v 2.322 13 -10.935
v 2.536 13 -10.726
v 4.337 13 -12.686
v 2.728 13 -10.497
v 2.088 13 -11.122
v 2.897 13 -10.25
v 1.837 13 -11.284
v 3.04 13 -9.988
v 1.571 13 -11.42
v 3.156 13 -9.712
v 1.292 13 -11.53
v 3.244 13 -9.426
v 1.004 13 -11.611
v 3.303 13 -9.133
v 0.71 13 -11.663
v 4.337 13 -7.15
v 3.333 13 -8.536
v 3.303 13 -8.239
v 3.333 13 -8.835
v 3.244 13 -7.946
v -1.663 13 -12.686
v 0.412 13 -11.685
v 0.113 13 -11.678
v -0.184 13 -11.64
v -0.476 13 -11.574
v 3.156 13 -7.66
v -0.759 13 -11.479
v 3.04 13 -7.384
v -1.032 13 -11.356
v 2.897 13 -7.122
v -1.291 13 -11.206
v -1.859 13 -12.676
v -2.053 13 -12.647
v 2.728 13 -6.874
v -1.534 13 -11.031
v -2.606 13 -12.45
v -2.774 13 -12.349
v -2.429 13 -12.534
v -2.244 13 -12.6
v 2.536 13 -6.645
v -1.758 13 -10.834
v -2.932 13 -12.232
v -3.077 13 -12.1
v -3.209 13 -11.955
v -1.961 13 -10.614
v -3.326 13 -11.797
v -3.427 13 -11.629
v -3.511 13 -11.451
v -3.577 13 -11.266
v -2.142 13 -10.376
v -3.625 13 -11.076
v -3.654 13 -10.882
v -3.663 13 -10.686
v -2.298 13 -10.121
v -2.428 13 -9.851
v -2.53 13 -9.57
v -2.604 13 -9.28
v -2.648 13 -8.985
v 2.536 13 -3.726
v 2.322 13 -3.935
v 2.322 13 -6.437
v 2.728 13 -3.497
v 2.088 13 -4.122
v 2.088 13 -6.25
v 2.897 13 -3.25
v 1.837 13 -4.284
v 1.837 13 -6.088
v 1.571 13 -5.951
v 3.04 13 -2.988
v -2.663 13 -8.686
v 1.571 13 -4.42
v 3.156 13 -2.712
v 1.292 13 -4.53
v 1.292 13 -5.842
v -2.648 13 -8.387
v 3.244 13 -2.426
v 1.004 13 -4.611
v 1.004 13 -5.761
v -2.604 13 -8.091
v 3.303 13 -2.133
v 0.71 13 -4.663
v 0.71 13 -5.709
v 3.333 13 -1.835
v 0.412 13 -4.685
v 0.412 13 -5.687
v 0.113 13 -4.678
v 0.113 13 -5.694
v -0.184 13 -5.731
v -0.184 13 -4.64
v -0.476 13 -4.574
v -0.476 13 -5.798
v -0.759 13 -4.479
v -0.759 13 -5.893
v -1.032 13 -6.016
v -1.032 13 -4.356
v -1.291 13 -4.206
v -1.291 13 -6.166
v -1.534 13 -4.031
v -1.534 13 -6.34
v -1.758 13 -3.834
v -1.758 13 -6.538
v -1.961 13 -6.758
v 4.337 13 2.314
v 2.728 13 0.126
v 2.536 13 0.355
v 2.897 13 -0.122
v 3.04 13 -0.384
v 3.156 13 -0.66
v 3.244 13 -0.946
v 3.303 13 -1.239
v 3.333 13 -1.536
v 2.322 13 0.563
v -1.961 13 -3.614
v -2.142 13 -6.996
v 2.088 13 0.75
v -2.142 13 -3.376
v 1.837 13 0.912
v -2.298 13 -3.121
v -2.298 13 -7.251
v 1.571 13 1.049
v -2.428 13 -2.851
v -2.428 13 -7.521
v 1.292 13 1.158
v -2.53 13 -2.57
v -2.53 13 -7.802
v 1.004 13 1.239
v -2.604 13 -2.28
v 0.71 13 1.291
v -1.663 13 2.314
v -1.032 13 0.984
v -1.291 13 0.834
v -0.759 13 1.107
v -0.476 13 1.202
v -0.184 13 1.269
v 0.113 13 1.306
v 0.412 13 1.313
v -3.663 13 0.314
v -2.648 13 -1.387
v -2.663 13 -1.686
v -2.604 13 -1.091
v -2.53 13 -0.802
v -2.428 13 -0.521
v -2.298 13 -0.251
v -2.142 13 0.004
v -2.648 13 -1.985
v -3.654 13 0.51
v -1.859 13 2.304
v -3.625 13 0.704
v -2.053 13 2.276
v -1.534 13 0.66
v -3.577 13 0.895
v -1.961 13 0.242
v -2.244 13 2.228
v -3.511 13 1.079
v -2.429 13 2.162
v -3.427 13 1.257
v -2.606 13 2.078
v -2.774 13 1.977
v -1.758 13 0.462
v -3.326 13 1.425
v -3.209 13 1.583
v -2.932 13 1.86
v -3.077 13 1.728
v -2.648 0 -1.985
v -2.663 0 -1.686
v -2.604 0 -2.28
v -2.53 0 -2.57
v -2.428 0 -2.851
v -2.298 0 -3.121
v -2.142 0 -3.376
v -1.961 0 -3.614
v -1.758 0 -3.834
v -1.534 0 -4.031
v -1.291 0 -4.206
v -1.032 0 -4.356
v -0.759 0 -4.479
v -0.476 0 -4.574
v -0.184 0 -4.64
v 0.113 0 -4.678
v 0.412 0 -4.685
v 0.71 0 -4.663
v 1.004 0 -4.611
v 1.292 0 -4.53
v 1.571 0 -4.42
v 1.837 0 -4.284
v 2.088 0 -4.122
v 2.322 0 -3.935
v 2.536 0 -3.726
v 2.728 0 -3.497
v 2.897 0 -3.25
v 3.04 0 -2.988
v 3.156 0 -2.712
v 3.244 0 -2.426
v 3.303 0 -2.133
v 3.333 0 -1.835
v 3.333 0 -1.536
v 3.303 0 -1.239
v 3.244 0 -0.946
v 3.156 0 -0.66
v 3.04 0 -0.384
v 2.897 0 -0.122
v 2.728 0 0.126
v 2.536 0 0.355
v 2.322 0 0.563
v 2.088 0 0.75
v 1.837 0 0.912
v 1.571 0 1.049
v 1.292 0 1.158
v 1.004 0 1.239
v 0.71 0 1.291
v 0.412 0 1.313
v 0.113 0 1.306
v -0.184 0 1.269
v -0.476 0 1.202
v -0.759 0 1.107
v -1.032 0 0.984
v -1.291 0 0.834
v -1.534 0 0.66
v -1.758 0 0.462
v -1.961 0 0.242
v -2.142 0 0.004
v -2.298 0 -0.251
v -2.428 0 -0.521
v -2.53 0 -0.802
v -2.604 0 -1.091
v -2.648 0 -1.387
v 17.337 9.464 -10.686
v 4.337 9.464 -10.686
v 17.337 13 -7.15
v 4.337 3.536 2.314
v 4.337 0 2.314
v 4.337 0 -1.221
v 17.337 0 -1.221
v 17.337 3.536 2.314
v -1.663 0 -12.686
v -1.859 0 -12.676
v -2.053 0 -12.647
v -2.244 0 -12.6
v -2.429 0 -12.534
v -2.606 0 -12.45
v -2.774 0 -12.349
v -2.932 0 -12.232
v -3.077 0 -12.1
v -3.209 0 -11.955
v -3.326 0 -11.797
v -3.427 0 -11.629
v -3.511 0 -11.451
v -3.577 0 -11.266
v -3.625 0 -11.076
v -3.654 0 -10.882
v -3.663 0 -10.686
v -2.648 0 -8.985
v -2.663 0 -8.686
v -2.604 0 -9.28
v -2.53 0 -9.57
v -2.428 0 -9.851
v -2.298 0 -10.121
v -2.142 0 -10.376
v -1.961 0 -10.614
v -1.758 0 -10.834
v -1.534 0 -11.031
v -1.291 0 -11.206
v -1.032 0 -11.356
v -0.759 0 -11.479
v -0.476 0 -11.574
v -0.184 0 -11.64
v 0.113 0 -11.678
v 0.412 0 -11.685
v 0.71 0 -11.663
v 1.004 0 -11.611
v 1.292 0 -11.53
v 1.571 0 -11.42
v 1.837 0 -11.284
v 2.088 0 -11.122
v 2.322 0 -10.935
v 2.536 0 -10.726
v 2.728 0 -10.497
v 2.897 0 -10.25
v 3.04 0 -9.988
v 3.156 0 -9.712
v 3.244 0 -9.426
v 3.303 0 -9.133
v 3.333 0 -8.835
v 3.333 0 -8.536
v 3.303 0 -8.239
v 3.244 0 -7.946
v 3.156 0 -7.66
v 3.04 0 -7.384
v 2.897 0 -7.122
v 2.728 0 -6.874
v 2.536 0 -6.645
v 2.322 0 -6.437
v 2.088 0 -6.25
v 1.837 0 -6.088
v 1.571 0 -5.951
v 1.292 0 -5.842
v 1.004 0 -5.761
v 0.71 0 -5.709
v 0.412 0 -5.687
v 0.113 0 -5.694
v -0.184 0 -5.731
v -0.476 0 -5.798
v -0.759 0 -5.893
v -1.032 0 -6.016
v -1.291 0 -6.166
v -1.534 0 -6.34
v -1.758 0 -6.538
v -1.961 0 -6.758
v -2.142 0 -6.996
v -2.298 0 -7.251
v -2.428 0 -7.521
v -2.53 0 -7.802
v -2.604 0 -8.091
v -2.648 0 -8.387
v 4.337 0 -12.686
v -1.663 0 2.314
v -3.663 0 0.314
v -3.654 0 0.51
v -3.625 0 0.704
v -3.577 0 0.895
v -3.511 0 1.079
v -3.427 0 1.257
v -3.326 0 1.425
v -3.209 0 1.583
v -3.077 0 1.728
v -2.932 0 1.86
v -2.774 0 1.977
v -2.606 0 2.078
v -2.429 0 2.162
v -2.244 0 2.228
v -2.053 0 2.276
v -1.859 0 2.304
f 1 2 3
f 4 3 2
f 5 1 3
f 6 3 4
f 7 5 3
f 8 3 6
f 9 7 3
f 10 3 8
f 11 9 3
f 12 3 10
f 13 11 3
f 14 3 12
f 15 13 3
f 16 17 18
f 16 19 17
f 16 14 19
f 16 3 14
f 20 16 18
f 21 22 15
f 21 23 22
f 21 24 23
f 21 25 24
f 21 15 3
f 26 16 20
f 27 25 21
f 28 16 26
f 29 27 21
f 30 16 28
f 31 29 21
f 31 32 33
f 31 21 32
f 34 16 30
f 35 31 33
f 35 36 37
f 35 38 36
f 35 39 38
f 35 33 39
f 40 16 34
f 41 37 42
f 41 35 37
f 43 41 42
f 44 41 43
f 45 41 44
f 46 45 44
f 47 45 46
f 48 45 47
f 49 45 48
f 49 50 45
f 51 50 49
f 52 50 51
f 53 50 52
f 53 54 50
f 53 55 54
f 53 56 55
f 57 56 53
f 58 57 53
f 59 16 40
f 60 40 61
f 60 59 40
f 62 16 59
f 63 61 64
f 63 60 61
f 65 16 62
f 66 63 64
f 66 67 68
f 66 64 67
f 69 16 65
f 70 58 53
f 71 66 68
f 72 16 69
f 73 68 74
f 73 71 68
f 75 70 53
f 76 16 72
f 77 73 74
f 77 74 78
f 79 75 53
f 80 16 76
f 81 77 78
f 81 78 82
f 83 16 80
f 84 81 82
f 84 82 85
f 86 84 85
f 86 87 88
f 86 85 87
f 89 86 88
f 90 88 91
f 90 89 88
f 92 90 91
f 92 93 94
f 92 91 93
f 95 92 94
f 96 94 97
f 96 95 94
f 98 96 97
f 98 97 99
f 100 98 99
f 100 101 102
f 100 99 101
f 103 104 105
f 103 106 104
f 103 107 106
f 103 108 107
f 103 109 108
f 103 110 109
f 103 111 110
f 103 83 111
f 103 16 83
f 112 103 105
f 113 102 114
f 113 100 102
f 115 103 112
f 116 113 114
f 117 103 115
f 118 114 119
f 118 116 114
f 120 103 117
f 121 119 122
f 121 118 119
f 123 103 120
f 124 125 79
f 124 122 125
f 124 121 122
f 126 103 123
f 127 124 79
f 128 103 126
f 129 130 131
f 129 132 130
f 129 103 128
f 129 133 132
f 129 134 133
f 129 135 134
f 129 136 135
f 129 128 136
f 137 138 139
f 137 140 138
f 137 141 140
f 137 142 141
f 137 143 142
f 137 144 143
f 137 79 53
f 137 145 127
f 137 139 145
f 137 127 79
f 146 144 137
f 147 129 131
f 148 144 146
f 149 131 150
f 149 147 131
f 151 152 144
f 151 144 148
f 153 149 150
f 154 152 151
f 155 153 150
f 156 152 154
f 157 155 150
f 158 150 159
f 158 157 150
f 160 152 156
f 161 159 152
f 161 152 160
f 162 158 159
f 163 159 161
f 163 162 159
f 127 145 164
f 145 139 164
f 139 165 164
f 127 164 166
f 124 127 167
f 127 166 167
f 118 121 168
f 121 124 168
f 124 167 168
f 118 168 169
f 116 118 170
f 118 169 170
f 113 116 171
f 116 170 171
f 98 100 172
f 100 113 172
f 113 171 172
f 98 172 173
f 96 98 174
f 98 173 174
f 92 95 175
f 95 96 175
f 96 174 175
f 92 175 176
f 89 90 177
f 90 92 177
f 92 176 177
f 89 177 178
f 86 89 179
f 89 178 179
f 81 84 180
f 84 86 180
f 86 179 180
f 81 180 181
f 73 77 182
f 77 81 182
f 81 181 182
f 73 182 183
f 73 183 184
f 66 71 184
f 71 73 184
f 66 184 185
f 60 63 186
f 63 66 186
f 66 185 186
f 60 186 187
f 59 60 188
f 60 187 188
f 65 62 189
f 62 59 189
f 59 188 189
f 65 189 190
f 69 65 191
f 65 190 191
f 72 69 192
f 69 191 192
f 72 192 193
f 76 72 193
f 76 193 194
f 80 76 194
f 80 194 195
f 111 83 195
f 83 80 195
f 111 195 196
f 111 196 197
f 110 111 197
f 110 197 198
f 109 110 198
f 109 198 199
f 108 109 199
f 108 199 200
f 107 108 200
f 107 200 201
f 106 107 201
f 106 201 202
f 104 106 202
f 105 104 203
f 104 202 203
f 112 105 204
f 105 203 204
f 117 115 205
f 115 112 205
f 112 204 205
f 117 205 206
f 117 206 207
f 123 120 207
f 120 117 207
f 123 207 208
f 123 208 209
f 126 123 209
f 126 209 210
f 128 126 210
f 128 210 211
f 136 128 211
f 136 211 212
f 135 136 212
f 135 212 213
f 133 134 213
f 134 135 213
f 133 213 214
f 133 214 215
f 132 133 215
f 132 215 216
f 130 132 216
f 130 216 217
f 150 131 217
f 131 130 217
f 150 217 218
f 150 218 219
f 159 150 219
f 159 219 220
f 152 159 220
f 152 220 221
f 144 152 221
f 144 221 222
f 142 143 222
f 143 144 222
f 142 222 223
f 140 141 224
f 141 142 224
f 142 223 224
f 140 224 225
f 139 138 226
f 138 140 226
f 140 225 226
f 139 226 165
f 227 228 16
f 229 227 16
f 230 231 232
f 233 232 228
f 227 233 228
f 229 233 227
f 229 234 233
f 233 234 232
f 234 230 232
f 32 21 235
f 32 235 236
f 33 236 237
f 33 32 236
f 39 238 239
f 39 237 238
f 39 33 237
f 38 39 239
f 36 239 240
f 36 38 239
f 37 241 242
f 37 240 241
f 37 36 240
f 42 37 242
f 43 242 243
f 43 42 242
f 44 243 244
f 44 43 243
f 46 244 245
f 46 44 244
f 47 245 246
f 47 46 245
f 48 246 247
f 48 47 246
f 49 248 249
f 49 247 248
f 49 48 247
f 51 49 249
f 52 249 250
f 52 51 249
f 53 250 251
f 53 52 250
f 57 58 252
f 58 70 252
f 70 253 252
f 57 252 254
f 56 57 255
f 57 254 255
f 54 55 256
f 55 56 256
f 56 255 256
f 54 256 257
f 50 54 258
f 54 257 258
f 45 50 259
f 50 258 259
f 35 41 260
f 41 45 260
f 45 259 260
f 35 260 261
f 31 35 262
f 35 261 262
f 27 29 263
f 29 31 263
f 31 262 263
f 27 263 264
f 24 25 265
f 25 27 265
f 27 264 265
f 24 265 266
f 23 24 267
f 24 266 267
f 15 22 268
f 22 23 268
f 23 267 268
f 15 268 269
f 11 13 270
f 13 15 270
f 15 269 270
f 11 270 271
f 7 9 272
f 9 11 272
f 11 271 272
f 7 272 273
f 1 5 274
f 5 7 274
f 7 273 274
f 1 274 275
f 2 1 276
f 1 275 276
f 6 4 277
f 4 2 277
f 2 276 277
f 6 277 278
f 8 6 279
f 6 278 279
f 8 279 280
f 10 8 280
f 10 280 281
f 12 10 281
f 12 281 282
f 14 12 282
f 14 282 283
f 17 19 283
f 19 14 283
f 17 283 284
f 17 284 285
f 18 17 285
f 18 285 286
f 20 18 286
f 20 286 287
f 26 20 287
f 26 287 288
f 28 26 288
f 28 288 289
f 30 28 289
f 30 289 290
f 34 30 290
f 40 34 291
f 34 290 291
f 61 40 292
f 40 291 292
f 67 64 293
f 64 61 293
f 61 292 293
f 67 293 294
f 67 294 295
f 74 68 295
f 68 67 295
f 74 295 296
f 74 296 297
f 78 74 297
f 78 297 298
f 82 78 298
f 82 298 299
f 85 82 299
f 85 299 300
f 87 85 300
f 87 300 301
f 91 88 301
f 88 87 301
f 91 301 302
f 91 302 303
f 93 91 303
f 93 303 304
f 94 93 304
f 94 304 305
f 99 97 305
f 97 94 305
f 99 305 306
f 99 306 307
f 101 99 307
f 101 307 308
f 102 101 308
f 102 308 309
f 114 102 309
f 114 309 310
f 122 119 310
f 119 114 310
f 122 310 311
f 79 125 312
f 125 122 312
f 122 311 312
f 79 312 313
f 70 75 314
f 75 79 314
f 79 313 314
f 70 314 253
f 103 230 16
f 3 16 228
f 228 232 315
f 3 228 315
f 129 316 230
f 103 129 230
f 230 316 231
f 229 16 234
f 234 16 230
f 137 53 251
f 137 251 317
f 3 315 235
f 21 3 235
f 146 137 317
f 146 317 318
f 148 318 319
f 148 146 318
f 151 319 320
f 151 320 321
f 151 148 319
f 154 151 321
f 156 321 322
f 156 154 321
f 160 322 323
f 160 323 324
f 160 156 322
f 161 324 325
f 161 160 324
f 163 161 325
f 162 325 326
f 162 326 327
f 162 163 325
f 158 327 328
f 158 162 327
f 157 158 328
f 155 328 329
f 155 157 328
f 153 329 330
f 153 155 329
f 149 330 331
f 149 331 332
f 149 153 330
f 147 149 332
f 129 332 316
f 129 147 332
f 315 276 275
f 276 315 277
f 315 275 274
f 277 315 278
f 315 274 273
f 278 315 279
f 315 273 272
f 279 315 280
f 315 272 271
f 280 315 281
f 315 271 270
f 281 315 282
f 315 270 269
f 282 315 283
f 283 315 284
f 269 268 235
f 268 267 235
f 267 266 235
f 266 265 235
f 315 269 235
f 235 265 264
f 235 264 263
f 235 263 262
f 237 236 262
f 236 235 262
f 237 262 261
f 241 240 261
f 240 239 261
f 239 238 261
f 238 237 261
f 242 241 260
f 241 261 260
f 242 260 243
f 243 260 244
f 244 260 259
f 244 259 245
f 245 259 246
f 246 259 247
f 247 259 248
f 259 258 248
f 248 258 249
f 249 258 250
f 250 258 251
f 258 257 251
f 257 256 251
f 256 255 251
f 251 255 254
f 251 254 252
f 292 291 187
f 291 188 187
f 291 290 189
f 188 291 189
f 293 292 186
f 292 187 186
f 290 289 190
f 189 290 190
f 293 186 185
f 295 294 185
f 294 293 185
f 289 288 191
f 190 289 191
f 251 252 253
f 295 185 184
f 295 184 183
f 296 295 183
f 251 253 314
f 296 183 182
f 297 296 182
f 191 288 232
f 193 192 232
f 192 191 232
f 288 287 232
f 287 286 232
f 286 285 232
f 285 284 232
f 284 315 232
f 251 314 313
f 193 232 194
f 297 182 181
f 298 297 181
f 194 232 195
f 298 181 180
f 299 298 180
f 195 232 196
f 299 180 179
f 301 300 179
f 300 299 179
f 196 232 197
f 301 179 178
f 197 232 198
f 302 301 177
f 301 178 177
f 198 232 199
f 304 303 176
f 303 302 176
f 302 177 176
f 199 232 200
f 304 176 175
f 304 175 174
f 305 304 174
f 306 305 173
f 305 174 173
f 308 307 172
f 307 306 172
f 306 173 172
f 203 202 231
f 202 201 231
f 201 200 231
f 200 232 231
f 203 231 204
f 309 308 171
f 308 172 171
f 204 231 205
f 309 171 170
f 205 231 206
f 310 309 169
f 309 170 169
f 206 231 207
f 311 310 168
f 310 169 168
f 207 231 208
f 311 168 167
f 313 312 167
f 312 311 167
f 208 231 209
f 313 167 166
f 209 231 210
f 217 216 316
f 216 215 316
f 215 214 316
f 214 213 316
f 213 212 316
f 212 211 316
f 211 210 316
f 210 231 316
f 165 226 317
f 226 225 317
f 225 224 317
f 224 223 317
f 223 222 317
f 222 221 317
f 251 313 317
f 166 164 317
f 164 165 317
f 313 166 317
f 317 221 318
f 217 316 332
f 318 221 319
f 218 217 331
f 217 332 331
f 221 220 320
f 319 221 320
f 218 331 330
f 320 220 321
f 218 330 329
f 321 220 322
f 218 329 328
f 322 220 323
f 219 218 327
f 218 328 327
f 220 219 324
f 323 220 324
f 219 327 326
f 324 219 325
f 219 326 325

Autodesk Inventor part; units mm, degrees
ref_plane "YZ Plane" through (0, 0, 0) normal (1, 0, 0) x (0, 1, 0)
ref_plane "XZ Plane" through (0, 0, 0) normal (0, 1, 0) x (-1, 0, 0)
ref_plane "XY Plane" through (0, 0, 0) normal (0, 0, 1) x (1, 0, 0)
sketch "Szkic1" plane through (0, 0, 0) normal (0, 1, 0) x (-1, 0, 0)
  circle A0 centre (-0.3368, -8.6859) radius 3
  circle A1 centre (-0.3368, -1.6859) radius 3
  line L0 (3.6632, 2.3141) -> (-4.3368, 2.3141)
  line L1 (-4.3368, 2.3141) -> (-4.3368, -12.6859)
  line L2 (-4.3368, -12.6859) -> (3.6632, -12.6859)
  line L3 (3.6632, -12.6859) -> (3.6632, 2.3141)
  point P0 (0, 0)
  dimension "d0" = 6
  dimension "d1" = 6
  dimension "d2" = 7
  dimension "d3" = 8
  dimension "d4" = 15
  dimension "d5" = 4
  dimension "d6" = 4
extrude "Wyciągnięcie proste1" add sketch "Szkic1" along normal blind 13
fillet "Zaokrąglenie1" radius 2 2 edges at (-3.6632, 6.5, 2.3141) (-3.6632, 6.5, -12.6859)
sketch "Szkic2" plane through (4.3368, 0, 0.3141) normal (1, 0, 0) x (0, 0, -1)
  line L0 (6, 13) -> (6, 0) construction
  line L1 (-2, 0) -> (13, 0) projected
  line L2 (13, 0) -> (13, 13) projected
  line L3 (-2, 13) -> (13, 13) projected
  line L4 (-2, 0) -> (-2, 13) projected
  line L5 (-2, 3.5355) -> (1.5355, 0)
  line L6 (-2, 3.5355) -> (3, 3.5355) construction
  line L7 (1.5355, 0) -> (11, 9.4645)
  line L8 (11, 9.4645) -> (7.4645, 13)
  line L9 (7.4645, 13) -> (-2, 3.5355)
  line L10 (-2, 0) -> (-2, 13) construction
  dimension "d18" = 45
  dimension "d19" = 90
  dimension "d20" = 90
  dimension "d21" = 5
extrude "Wyciągnięcie proste2" add sketch "Szkic2" along normal blind 13 and the other way blind 1 contours L5 L9 L8 L7
properties part number "obudowa_stand"
